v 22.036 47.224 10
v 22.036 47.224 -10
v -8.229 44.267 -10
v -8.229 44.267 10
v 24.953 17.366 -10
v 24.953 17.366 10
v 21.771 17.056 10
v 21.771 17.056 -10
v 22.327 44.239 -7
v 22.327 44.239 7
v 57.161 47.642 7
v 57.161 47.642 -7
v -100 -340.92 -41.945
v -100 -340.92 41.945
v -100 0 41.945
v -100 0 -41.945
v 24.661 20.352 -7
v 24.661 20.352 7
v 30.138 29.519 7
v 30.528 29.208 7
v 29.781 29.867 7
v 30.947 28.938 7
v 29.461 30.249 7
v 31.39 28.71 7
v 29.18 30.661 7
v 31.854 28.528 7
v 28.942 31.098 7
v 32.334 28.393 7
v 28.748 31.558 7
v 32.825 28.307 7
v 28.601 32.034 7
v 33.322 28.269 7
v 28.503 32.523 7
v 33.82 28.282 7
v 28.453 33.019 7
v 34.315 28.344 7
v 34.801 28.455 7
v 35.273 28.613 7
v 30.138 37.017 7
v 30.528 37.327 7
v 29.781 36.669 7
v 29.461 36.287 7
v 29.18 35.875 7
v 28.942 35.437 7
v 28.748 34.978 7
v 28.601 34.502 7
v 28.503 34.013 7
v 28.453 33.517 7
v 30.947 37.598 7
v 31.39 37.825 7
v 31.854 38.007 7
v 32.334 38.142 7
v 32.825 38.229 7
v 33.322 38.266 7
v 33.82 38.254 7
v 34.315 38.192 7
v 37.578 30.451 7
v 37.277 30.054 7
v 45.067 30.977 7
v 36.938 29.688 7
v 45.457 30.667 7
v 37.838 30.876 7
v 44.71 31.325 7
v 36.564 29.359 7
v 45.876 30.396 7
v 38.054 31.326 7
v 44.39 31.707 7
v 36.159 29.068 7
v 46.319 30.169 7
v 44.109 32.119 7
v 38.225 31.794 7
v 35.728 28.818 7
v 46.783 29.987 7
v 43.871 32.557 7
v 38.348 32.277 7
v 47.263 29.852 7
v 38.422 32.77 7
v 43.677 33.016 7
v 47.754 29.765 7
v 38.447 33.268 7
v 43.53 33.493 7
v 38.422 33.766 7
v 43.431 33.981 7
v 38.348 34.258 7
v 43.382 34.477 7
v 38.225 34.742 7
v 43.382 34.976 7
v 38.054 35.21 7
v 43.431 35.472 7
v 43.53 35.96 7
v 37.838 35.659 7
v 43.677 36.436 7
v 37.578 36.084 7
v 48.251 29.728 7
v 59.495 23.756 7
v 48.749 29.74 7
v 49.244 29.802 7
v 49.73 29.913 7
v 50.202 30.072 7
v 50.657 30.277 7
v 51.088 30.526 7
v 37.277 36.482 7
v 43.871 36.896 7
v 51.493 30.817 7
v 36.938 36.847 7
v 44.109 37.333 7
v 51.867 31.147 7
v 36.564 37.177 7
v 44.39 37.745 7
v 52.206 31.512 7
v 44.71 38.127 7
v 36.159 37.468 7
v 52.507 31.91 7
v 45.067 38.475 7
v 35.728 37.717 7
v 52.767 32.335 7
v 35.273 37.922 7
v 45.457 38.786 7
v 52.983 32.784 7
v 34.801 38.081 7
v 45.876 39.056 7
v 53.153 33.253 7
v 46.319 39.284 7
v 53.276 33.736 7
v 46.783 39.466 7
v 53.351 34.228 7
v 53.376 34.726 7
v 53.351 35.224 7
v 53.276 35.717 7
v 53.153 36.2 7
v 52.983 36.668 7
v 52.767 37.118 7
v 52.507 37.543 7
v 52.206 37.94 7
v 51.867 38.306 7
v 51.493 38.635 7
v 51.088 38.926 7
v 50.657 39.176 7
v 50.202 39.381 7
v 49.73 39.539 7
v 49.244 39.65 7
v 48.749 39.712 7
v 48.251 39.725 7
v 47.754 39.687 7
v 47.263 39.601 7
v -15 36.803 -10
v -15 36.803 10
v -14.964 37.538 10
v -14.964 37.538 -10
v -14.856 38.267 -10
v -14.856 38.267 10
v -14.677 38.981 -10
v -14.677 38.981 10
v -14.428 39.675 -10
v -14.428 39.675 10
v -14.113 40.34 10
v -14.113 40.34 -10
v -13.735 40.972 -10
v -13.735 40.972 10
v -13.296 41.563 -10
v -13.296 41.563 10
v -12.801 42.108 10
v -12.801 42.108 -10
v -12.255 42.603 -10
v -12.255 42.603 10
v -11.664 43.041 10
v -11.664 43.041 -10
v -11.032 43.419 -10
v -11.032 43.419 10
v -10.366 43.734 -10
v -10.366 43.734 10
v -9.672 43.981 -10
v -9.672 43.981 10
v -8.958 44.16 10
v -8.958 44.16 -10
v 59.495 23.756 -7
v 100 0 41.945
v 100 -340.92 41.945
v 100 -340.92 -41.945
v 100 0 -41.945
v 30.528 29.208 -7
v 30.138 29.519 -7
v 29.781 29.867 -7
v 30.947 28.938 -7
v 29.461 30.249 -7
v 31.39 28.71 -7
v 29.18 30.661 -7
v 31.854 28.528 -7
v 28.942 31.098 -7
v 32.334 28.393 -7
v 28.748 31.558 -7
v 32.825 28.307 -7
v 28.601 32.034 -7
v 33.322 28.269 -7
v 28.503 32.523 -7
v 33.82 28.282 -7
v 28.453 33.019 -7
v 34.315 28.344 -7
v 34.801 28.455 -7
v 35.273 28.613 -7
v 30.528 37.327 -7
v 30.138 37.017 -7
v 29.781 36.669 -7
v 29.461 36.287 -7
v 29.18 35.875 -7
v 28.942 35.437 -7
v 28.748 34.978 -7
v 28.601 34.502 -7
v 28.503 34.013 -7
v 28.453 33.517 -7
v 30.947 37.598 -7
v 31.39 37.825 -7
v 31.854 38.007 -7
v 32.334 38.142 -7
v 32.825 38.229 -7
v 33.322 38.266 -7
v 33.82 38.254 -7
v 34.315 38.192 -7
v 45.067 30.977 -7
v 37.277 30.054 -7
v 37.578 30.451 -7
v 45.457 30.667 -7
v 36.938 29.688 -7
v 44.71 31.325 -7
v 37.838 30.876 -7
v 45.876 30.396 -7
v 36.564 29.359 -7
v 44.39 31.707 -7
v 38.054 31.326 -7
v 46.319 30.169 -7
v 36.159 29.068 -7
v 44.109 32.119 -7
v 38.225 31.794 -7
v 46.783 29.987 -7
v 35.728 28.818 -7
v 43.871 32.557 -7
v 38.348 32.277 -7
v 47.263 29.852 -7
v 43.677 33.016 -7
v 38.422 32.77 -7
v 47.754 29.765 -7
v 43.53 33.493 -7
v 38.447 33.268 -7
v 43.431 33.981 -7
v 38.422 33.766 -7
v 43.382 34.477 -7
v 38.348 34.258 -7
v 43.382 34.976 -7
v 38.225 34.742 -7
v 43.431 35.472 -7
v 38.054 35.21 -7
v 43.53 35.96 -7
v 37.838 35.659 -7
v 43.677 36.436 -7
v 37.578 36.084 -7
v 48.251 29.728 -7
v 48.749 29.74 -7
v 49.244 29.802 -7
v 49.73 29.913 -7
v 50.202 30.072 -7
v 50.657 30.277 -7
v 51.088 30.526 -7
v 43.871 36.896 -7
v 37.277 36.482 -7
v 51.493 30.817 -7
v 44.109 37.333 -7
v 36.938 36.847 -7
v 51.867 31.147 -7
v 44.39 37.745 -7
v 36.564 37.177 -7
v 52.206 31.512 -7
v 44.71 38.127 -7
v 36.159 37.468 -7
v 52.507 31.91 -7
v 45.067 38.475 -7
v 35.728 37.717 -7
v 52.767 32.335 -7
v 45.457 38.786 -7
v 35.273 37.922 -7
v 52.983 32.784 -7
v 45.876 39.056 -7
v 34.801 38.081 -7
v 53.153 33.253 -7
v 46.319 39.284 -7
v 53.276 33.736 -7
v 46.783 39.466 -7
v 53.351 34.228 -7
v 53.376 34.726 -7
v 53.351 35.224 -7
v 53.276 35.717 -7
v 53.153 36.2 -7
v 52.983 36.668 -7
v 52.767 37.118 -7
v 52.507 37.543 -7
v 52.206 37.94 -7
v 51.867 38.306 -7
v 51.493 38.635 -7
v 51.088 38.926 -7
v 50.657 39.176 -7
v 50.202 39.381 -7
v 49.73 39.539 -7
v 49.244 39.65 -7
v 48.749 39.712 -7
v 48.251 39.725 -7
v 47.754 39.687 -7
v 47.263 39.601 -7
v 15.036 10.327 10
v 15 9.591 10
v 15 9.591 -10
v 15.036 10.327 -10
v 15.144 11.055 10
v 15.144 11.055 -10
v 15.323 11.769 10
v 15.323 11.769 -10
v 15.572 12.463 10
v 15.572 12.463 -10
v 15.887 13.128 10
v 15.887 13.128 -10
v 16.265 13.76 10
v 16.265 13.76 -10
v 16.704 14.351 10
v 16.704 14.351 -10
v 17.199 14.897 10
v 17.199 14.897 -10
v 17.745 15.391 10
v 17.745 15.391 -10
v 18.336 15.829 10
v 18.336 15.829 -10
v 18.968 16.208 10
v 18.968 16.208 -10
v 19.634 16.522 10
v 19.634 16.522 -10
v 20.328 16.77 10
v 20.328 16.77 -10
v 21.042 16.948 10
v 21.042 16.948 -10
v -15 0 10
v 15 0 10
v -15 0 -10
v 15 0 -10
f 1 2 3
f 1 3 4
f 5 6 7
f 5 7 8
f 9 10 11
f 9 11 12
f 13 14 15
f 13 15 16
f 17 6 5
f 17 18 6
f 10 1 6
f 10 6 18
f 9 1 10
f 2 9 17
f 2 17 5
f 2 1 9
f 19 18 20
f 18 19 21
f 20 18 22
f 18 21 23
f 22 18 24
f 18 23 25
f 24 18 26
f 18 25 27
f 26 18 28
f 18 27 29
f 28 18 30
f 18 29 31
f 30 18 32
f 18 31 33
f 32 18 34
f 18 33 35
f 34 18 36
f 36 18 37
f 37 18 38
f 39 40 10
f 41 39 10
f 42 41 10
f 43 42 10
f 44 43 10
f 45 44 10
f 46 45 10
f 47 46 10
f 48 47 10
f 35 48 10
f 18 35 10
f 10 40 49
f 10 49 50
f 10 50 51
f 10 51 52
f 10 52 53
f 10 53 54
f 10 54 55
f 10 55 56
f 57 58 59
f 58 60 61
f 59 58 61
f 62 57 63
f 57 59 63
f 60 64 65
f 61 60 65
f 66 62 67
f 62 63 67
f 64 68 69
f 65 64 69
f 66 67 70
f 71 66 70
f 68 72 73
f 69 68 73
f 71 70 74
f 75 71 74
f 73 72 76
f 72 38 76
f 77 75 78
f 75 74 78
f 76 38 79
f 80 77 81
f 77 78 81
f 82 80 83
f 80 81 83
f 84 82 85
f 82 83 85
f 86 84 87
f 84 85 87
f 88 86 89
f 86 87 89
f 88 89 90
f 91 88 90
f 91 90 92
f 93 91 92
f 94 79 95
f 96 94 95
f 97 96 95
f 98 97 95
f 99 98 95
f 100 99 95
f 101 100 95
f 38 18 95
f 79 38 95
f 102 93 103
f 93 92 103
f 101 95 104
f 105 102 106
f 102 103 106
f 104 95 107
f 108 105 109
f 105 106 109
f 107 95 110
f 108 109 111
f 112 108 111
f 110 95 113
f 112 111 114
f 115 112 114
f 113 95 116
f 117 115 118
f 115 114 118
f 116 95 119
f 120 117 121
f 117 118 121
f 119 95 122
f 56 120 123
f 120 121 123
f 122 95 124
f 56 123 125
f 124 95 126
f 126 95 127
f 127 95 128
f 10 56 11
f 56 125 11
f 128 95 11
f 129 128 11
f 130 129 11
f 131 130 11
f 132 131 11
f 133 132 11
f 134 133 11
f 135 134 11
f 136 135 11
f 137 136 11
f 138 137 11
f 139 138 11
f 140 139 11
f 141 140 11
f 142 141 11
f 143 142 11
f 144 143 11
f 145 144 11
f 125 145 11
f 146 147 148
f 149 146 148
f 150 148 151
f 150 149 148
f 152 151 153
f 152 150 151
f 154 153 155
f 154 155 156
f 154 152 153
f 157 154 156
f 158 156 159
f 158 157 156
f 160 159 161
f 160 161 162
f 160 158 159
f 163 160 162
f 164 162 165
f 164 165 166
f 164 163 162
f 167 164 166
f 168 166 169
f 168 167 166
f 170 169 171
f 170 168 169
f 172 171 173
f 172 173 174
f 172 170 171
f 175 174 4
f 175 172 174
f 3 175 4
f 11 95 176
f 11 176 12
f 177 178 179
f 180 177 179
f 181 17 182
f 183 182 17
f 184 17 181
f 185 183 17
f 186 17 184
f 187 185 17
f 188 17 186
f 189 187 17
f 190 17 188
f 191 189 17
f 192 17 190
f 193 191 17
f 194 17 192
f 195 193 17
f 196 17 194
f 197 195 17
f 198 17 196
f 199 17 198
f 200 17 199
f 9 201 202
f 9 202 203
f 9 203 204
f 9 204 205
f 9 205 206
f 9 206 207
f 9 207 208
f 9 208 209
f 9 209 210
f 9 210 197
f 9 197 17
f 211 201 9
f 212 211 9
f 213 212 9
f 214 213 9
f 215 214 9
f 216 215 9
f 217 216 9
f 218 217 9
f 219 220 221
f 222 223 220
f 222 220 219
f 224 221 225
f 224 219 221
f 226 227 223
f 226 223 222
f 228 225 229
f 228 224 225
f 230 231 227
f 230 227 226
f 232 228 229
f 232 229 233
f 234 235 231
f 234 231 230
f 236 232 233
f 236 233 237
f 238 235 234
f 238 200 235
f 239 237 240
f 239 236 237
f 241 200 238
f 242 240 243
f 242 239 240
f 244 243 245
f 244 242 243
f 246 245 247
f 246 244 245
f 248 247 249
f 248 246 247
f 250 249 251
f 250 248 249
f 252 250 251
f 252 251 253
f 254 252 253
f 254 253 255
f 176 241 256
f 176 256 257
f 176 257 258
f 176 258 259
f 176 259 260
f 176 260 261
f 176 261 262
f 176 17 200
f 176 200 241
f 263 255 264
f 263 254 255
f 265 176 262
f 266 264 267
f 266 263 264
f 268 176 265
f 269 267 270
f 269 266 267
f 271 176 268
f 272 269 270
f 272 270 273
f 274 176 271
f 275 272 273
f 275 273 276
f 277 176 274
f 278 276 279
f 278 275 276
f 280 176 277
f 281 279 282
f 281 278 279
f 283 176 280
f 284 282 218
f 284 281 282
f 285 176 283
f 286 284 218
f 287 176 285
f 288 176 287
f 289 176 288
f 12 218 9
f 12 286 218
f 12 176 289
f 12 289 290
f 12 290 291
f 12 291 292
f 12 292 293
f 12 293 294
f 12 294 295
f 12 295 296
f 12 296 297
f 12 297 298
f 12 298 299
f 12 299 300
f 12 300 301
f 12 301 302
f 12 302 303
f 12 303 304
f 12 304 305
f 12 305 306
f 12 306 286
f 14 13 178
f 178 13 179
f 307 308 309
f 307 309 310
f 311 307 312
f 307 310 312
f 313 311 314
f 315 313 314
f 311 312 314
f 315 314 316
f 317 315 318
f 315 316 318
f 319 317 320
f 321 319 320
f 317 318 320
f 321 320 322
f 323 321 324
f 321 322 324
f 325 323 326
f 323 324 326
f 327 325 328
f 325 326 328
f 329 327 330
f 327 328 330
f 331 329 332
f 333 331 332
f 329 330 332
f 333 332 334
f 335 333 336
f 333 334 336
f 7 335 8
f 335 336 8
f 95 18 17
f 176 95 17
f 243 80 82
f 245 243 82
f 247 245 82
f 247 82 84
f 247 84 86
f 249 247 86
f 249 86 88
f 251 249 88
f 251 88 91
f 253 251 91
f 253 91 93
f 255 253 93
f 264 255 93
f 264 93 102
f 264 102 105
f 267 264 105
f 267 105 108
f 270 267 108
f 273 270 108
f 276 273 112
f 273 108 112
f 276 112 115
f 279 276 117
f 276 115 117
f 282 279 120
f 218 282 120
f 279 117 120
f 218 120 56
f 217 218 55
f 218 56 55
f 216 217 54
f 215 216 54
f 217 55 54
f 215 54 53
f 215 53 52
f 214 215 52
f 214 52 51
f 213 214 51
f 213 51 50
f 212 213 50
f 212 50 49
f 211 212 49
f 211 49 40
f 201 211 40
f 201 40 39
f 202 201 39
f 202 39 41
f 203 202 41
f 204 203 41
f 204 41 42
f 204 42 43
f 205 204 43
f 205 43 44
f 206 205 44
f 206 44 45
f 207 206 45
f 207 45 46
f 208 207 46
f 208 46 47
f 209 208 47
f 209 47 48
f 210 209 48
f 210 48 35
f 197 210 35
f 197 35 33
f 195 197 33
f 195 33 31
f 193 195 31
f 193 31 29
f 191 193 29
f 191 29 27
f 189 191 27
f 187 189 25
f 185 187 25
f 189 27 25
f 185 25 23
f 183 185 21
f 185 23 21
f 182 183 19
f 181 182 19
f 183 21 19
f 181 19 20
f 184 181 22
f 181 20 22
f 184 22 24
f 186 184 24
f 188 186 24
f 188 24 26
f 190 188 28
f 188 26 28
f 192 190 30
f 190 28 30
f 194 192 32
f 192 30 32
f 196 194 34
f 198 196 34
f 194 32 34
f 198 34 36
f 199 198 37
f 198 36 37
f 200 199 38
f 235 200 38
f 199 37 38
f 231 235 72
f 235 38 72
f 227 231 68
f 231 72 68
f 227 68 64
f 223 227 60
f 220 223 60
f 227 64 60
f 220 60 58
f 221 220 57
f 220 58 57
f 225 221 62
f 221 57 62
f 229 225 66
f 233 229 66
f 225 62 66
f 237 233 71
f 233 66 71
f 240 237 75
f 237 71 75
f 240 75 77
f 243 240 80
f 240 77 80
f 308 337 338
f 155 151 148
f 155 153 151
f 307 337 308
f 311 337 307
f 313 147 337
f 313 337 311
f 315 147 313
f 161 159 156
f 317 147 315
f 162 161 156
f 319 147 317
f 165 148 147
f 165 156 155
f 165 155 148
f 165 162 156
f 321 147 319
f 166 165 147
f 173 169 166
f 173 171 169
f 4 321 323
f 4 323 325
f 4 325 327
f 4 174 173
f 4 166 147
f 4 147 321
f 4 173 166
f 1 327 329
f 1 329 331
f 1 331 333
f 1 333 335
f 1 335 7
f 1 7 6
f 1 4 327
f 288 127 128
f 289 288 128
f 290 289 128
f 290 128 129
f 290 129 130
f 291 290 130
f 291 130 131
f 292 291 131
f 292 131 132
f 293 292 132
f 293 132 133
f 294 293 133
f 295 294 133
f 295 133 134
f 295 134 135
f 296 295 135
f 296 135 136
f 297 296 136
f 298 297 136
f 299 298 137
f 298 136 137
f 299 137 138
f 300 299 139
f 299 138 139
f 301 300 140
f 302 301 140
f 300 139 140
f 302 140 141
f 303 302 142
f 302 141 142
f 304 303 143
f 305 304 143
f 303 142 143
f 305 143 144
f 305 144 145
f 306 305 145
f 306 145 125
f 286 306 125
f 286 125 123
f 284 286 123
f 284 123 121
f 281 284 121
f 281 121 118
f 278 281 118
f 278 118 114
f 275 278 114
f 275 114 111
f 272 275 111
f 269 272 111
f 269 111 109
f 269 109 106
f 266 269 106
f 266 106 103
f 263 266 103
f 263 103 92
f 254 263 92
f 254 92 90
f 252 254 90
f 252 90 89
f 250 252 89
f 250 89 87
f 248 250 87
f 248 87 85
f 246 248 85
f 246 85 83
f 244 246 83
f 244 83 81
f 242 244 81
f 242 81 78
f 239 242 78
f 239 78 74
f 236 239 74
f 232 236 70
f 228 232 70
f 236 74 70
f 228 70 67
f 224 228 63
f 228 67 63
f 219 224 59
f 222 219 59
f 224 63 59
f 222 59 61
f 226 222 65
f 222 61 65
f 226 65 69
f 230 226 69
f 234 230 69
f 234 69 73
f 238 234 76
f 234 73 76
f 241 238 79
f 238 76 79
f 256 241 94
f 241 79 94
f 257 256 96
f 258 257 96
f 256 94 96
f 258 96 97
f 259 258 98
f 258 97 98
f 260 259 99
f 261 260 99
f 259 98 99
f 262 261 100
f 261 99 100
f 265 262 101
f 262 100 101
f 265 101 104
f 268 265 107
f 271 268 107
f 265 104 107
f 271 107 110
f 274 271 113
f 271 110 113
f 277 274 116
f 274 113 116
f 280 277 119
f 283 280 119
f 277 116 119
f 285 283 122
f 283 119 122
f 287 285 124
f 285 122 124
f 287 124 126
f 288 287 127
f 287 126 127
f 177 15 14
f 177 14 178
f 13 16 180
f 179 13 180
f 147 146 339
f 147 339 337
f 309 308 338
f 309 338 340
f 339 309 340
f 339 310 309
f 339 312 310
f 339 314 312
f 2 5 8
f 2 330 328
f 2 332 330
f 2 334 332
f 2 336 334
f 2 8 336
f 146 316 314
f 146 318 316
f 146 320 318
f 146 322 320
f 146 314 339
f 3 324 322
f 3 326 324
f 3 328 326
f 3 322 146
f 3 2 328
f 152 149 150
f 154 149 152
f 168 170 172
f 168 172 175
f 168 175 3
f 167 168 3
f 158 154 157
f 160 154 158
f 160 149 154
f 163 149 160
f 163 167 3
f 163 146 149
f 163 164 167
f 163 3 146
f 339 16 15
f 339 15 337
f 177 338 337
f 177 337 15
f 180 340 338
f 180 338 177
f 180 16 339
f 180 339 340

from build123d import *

# Parameters (mm, degrees)
SKETCH1_W                  = 200
SKETCH1_H                  = 83.89
WHEEL_STEERING_DUMMY_DEPTH = 340.92
SKETCH4_W                  = 30
SKETCH4_H                  = 20
SKETCH5_W                  = 20
SKETCH5_H                  = 30
SKETCH5_W_2                = 14
SKETCH5_H_2                = 24
MOUNT_TONGUE_DEPTH         = 35
SKETCH6_R                  = 5
MOUNT_HOLES_DEPTH          = 359.639177203
FILLET1_R                  = 7.5


with BuildPart() as part:
    # Sketch1 → Wheel & Steering Dummy (new body)
    with BuildSketch(Plane(origin=(0, 0, 0), x_dir=(1, 0, 0), z_dir=(0, 1, 0))):
        Rectangle(SKETCH1_W, SKETCH1_H)
    extrude(amount=-WHEEL_STEERING_DUMMY_DEPTH)

    # Mount Body: sweep along a path in Sketch3
    with BuildLine(Plane.XY) as mount_body_path:
        Line((0, 0), (0, 30))
        Line((0, 30), (58.328201005, 35.698665242))
    # Sketch4 → Mount Body (sweep)
    with BuildSketch(Plane(origin=(0, 0, 0), x_dir=(1, 0, 0), z_dir=(0, 1, 0))):
        Rectangle(SKETCH4_W, SKETCH4_H)
    sweep(path=mount_body_path.line, transition=Transition.RIGHT)

    # Sketch5 → Mount Tongue (cut)
    with BuildSketch(Plane(origin=(61.231488288, 5.982316409, 0), x_dir=(0, 0, -1), z_dir=(0.9952612526754551, 0.09723702444482771, 0))):
        with Locations((0, 29.85783758)):
            Rectangle(SKETCH5_W, SKETCH5_H)
        with Locations((0, 29.85783758)):
            Rectangle(SKETCH5_W_2, SKETCH5_H_2, mode=Mode.SUBTRACT)
    extrude(amount=-MOUNT_TONGUE_DEPTH, mode=Mode.SUBTRACT)

    # Sketch6 → Mount Holes (cut, through all)
    with BuildSketch(Plane.XY.offset(7)):
        with Locations((33.446669688, 33.26773963)):
            Circle(SKETCH6_R)
        with Locations((48.375588478, 34.726294997)):
            Circle(SKETCH6_R)
    extrude(amount=-MOUNT_HOLES_DEPTH, mode=Mode.SUBTRACT)

    # Fillet1
    fillet1_edges = [part.edges().sort_by_distance(p)[0] for p in [
        (-15, 43.605919649, 0),
        (15, 16.394080351, 0),
    ]]
    fillet(fillet1_edges, radius=FILLET1_R)


solid = part.part
